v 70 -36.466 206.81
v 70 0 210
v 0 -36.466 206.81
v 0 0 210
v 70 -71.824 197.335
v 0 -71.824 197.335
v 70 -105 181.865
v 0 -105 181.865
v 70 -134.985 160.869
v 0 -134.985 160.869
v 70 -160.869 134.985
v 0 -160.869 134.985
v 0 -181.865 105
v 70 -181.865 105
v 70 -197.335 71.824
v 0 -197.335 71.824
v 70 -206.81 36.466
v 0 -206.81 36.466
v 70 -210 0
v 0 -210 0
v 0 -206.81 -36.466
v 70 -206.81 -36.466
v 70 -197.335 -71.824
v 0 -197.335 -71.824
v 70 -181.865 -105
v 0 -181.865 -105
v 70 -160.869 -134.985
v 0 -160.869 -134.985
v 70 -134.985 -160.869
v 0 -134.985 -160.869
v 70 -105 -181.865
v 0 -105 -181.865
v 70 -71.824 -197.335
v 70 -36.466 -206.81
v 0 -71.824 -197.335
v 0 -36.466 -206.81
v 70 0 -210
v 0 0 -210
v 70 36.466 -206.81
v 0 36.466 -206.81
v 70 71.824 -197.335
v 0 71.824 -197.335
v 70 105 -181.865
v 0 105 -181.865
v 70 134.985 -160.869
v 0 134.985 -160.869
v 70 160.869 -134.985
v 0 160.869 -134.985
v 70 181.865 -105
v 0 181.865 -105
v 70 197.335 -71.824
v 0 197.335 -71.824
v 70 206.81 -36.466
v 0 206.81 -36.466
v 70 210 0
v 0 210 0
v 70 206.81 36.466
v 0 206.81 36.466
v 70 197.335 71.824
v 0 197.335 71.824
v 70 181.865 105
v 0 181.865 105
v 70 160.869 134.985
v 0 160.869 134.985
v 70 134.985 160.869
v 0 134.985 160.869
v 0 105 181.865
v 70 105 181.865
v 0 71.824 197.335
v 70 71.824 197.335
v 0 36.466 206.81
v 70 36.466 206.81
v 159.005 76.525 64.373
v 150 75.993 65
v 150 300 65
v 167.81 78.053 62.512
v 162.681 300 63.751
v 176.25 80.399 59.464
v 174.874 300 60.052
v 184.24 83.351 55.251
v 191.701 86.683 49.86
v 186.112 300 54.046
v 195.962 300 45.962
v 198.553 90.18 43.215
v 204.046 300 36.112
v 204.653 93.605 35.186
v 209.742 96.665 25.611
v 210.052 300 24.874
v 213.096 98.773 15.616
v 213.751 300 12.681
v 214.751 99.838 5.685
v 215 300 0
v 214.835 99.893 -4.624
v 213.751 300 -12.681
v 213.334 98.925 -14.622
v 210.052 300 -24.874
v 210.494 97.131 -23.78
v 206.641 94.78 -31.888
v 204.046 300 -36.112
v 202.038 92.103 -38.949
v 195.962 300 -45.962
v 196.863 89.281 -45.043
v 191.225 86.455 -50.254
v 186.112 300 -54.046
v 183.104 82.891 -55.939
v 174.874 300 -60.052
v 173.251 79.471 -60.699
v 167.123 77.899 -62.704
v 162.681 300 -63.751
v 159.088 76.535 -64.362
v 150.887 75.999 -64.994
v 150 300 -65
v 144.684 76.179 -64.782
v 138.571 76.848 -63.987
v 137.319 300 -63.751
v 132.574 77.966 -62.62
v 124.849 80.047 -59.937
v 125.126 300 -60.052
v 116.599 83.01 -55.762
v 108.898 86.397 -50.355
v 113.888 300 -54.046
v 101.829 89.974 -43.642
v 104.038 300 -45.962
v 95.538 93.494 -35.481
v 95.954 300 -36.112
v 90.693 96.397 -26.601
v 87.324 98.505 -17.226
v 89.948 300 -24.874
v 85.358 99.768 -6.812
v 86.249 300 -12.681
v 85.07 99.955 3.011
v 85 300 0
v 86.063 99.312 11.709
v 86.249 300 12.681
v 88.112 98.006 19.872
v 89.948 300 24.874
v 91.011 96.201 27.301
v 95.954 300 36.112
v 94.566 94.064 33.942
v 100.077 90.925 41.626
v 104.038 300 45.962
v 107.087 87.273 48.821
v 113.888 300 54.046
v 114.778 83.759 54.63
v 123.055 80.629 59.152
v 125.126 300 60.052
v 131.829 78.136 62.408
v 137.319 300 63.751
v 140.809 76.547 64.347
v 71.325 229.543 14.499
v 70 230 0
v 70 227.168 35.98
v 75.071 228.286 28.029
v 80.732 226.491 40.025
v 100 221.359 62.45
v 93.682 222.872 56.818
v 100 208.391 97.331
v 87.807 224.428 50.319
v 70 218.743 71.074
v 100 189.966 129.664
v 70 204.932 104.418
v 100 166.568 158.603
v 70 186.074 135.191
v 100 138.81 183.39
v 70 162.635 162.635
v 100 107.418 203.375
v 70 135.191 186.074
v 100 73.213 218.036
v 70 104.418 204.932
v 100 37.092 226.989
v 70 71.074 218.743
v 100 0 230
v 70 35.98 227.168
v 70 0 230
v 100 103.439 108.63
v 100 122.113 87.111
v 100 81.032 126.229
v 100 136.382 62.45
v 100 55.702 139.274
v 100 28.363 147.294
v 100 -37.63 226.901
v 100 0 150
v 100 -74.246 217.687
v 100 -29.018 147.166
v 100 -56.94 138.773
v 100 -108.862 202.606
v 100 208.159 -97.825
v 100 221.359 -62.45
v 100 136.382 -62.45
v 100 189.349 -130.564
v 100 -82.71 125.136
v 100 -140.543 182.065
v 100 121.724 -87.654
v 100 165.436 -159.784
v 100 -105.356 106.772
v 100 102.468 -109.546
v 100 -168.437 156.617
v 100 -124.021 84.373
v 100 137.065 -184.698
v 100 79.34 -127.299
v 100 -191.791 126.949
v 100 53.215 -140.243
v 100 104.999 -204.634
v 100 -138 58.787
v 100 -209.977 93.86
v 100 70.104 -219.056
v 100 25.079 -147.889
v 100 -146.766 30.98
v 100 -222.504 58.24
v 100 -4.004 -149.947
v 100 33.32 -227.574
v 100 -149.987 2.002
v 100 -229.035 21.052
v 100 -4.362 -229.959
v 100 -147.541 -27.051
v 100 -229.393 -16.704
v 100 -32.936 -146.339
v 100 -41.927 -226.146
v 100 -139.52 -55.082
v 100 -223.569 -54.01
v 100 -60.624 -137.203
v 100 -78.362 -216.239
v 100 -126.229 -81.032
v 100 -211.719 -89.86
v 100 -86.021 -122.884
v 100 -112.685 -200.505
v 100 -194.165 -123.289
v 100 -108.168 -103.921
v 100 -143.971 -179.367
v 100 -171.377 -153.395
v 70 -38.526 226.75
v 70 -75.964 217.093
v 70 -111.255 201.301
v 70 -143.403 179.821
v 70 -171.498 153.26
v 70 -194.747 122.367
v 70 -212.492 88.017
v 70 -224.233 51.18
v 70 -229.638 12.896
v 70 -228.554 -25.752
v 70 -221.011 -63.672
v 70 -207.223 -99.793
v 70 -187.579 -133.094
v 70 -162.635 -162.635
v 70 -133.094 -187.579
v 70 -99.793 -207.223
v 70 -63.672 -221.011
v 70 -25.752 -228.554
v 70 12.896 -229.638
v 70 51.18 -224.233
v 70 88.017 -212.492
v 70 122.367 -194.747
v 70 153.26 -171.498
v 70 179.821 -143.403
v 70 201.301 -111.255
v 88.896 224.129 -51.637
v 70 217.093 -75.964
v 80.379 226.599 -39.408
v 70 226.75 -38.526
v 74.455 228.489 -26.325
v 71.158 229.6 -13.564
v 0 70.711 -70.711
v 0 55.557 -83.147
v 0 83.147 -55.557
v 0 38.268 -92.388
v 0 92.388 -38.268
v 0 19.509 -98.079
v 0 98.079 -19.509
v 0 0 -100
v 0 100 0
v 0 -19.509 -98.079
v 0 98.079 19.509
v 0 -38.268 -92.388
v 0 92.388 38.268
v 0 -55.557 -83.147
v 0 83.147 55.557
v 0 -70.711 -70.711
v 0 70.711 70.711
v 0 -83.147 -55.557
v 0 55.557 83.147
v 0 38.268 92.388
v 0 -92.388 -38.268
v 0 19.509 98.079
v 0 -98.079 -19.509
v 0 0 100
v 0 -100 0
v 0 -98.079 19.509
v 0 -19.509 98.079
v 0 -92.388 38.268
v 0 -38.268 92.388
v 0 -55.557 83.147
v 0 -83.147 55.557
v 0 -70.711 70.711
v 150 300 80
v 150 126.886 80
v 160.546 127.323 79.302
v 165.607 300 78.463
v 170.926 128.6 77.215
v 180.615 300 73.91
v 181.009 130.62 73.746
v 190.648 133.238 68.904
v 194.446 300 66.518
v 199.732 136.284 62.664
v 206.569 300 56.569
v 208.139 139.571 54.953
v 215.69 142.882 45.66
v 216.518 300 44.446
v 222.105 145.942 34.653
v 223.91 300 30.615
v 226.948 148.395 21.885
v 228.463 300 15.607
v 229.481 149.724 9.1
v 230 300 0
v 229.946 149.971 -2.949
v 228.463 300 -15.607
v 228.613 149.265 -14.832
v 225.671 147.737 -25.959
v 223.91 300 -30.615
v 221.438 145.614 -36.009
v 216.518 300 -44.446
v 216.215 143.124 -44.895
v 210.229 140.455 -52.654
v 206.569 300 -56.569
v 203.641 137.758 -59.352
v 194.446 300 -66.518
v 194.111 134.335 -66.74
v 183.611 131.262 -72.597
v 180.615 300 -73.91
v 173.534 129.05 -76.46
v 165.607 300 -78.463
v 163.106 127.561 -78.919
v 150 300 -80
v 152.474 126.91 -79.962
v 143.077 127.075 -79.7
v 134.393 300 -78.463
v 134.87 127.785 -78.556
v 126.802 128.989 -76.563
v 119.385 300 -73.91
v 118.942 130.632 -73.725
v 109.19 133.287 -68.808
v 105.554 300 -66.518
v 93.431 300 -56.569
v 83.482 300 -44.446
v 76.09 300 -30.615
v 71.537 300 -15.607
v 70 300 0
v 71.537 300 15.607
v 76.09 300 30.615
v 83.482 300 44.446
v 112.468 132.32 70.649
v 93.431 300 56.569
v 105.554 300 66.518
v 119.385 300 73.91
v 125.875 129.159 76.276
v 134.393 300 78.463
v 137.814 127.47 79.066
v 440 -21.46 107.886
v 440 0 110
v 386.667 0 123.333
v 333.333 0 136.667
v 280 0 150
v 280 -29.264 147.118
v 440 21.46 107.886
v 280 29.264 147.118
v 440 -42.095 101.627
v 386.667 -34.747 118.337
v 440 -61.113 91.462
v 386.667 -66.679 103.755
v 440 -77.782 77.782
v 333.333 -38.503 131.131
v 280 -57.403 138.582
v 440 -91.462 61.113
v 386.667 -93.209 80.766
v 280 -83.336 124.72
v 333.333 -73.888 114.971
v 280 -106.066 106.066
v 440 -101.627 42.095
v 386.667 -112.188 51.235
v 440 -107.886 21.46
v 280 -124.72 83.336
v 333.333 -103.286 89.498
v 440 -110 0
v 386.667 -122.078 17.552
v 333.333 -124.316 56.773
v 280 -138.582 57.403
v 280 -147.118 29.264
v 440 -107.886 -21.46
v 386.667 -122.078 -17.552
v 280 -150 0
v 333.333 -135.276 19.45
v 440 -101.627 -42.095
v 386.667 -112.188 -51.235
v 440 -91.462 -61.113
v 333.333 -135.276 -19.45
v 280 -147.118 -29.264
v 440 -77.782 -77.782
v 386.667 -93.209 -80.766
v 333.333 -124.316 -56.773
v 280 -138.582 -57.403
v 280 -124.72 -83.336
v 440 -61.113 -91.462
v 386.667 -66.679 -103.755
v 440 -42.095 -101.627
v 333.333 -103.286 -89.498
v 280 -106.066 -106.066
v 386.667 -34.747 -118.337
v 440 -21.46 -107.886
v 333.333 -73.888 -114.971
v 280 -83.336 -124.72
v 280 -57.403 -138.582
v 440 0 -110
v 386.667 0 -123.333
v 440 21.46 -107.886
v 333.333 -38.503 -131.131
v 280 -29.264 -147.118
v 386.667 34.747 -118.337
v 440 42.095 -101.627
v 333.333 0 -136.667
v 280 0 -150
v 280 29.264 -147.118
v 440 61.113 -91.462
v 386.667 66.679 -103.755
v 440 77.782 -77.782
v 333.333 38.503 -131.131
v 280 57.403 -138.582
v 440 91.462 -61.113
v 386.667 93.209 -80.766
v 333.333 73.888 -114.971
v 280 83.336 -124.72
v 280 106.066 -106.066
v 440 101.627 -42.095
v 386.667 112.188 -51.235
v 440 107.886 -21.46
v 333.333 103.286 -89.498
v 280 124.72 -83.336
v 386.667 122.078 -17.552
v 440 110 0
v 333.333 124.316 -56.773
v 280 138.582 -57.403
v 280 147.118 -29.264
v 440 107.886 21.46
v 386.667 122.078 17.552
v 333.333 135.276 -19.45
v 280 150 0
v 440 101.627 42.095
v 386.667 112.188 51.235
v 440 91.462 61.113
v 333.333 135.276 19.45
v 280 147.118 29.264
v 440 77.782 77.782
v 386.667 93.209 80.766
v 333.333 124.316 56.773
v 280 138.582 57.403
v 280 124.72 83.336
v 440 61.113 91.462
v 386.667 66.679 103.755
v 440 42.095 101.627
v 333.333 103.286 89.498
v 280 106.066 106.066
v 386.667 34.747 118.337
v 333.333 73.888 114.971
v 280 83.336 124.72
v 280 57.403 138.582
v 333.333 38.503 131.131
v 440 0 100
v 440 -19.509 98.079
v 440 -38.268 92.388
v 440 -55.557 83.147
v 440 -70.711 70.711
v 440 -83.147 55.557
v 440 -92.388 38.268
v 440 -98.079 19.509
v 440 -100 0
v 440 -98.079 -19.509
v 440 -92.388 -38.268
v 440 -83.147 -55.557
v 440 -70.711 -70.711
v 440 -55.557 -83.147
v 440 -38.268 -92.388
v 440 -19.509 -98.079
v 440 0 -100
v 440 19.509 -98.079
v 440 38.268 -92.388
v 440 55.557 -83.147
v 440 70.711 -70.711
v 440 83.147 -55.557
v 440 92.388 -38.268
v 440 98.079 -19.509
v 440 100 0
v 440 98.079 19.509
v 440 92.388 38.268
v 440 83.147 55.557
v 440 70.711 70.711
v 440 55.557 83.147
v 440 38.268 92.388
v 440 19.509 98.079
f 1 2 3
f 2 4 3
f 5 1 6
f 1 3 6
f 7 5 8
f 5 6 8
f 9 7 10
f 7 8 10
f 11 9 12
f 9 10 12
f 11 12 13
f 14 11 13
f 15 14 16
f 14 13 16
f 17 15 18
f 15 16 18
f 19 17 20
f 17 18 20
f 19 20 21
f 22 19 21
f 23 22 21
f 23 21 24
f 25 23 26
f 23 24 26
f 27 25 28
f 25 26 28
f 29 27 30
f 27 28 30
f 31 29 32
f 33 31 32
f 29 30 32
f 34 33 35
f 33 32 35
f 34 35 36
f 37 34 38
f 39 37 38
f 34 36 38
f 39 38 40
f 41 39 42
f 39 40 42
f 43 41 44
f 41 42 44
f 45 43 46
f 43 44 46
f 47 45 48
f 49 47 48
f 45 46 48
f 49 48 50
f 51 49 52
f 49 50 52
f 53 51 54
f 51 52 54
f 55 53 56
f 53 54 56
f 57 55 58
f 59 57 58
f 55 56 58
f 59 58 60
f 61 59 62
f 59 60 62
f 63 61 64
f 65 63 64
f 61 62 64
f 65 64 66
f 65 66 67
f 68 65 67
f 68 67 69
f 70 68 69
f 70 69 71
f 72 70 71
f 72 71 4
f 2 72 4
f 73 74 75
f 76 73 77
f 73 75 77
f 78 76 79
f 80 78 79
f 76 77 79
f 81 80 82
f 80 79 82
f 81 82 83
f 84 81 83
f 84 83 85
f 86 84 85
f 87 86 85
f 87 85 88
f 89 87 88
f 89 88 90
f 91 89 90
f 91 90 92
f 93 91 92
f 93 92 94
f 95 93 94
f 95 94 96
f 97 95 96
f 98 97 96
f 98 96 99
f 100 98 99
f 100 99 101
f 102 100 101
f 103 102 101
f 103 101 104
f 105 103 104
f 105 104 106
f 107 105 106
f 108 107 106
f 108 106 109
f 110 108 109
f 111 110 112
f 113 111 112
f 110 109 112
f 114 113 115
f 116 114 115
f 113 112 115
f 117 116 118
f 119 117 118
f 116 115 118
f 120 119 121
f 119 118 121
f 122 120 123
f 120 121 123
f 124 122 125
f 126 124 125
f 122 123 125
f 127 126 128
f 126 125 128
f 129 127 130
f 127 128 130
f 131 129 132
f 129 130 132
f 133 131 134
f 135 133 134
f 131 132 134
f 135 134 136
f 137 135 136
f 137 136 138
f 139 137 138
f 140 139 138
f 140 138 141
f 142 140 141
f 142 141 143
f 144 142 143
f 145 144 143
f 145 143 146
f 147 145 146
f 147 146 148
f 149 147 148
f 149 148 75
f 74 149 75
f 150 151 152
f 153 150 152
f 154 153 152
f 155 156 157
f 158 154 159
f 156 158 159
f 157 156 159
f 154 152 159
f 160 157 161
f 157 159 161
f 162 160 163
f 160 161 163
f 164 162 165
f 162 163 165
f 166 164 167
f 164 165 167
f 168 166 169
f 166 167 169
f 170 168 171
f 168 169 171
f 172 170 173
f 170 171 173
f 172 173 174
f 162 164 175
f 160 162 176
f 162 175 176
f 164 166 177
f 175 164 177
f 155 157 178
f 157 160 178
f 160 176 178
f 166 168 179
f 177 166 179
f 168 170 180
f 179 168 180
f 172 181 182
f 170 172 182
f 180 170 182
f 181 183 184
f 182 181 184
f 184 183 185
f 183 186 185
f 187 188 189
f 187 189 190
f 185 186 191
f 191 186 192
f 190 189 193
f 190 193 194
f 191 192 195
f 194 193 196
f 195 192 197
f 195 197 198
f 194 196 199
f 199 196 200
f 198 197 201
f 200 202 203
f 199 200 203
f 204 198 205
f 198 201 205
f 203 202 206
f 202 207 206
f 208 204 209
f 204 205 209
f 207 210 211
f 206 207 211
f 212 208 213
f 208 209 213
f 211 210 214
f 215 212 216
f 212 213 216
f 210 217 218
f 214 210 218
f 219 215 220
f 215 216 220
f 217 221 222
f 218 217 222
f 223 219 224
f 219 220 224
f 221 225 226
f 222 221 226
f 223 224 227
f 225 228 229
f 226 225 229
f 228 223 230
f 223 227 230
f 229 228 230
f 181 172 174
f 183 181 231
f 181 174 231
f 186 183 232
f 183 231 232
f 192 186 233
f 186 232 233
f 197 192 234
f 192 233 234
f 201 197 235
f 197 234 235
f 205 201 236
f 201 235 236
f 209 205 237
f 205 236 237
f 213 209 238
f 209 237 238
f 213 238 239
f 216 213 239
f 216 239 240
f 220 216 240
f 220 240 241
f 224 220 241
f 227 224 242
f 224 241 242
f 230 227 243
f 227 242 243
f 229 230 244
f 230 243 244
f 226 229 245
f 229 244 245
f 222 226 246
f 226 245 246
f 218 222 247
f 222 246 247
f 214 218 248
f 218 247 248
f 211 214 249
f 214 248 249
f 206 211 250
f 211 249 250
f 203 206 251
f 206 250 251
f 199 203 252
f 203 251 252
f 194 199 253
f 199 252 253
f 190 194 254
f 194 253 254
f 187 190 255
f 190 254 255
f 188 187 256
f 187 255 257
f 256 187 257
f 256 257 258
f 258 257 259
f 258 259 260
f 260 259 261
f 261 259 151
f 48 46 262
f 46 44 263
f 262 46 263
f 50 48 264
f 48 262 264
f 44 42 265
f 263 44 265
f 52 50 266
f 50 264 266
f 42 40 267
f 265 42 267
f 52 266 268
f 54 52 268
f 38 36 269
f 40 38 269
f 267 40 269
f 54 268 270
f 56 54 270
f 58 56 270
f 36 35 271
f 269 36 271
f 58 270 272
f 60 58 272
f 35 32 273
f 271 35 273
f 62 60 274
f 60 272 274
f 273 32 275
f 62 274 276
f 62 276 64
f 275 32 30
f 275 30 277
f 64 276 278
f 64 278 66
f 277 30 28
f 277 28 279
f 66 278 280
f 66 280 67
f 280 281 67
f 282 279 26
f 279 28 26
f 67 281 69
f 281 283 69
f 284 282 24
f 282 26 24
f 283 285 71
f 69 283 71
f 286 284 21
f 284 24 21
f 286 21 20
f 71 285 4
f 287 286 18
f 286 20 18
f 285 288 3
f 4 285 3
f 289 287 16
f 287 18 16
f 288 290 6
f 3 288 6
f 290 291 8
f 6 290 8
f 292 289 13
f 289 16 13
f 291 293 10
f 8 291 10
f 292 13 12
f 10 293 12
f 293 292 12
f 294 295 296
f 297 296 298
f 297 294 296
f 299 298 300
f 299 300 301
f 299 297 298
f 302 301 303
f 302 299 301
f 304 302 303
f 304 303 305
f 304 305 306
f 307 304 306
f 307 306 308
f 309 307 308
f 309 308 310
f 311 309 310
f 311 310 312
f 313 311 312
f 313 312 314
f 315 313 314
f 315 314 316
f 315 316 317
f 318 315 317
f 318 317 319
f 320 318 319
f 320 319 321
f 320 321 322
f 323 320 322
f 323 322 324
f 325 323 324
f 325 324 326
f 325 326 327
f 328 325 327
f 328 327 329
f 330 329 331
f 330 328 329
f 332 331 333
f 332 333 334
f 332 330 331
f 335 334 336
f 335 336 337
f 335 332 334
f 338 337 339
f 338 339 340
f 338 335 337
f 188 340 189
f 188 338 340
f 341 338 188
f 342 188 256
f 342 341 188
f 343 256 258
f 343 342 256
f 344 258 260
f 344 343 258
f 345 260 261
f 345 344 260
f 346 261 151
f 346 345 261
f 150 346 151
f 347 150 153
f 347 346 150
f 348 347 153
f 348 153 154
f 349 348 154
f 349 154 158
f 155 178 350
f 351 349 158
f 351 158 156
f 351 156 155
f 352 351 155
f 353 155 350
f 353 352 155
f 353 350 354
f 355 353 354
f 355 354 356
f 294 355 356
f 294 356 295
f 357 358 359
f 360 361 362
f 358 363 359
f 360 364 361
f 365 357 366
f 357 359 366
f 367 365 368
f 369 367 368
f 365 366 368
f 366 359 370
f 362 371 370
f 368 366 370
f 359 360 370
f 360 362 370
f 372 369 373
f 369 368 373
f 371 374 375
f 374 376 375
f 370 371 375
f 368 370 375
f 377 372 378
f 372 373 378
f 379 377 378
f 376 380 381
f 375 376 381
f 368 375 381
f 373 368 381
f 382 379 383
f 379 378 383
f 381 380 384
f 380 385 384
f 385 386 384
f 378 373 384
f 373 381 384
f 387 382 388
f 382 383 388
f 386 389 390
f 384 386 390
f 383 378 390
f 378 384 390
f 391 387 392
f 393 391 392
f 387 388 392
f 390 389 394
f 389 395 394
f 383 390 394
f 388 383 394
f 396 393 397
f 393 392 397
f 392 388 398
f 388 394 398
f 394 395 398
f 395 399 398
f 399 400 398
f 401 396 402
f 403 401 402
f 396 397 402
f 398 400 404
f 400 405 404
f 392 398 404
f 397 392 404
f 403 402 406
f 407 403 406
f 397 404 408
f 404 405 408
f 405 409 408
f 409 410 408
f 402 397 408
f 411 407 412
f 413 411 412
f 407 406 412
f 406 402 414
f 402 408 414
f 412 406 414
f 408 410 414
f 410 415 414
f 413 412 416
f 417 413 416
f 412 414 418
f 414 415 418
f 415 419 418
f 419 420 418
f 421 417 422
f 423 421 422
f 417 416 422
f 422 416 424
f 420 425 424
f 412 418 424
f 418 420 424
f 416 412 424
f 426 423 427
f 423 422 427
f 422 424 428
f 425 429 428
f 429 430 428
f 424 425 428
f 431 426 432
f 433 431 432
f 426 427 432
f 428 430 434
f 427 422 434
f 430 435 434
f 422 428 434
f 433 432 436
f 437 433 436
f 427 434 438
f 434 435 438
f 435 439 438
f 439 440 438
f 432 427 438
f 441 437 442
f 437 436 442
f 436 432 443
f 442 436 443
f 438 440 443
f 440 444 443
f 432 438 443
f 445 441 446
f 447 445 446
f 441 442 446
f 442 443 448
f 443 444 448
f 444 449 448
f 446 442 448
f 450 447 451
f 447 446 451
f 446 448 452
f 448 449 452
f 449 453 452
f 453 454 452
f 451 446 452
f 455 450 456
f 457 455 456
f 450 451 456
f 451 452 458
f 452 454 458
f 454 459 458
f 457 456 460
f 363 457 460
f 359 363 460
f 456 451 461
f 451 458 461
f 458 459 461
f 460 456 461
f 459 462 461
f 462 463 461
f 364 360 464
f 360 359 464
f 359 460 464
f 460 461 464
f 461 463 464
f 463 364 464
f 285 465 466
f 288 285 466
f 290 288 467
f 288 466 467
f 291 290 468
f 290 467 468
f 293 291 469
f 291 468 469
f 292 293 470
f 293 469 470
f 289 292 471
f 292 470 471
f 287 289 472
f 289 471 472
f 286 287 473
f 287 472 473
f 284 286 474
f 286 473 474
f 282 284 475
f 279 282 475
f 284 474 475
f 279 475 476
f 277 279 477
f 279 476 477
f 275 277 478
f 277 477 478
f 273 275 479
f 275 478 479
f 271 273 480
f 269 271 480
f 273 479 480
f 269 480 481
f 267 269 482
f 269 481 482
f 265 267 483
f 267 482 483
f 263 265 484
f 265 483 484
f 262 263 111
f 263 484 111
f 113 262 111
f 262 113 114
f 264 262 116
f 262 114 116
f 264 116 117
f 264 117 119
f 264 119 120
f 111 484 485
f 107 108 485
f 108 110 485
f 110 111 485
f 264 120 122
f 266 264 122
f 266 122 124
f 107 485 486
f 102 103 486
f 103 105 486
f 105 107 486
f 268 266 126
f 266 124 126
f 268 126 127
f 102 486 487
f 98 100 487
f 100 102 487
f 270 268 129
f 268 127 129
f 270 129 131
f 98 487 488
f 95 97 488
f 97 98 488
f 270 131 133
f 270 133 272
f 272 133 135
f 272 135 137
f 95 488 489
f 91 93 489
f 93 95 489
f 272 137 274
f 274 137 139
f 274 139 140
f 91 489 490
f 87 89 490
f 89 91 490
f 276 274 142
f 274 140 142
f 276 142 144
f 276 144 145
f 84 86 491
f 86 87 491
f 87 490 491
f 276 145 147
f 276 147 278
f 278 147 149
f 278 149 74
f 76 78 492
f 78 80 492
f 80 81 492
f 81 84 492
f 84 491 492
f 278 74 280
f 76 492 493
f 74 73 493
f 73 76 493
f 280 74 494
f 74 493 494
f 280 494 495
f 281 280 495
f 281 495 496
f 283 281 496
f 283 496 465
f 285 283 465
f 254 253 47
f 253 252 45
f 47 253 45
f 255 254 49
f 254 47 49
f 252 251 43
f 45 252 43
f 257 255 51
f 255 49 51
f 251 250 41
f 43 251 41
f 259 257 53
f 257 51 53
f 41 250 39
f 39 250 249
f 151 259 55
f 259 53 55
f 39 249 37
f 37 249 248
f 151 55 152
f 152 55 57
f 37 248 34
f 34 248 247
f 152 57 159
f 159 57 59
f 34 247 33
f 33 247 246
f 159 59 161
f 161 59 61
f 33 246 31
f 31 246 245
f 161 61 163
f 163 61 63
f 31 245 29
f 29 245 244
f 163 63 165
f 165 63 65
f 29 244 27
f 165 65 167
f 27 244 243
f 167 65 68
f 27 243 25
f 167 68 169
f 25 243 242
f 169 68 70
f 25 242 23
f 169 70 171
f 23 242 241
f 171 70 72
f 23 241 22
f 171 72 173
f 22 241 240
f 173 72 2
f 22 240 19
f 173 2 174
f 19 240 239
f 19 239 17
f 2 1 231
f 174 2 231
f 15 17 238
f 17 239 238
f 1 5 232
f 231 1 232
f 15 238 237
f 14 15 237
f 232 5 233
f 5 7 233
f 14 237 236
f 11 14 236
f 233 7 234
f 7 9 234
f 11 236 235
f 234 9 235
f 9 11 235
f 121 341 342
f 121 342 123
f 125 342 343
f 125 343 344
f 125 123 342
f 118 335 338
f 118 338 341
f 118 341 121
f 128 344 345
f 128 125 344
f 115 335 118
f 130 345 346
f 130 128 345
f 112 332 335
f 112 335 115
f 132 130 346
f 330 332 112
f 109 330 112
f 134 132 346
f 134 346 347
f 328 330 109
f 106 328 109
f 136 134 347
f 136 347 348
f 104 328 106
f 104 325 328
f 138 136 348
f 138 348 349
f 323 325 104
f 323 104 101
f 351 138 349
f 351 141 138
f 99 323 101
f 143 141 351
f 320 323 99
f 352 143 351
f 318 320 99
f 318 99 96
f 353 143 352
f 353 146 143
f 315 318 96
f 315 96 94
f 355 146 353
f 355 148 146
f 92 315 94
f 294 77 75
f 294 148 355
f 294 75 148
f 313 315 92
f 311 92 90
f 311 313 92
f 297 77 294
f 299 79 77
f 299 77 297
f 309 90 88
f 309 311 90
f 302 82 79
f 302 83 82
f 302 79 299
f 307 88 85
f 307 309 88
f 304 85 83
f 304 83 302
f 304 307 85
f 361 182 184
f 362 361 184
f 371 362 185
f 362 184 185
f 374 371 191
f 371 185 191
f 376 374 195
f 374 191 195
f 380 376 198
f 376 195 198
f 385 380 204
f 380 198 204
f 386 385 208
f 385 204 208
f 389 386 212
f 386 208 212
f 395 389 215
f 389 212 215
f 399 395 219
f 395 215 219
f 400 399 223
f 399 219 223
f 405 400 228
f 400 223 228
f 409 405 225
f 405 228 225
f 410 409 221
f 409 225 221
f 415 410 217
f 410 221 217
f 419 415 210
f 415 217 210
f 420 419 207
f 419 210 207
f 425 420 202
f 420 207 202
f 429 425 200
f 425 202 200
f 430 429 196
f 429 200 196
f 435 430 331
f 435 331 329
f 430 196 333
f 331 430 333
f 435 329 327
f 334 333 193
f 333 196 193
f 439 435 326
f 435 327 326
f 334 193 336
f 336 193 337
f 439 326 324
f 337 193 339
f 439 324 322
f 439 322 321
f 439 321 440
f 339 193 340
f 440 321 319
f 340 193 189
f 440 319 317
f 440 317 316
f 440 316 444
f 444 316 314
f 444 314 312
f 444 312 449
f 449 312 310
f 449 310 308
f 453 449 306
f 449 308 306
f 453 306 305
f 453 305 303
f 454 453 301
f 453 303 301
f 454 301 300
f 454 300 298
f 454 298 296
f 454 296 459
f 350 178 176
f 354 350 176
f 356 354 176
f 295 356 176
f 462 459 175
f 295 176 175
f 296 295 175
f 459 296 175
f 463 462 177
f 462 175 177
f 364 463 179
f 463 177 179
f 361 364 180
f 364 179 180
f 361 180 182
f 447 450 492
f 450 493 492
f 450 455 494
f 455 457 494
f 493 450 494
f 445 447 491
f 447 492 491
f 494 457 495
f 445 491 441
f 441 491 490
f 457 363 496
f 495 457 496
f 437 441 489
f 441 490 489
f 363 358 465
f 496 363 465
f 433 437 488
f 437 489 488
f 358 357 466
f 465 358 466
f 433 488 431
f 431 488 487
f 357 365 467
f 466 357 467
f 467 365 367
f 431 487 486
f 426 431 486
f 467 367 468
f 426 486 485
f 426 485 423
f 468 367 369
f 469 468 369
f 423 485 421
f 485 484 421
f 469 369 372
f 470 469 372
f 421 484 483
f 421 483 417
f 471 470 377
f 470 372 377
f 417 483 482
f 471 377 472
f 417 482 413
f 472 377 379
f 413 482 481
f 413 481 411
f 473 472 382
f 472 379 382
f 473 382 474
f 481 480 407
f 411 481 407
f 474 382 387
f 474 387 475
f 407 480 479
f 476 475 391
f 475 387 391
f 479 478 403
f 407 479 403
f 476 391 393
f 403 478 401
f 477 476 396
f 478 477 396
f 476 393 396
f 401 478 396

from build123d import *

# Parameters (mm, degrees)
BOSS_EXTRU_1_REACH      = 728.223
ESQUISSE3_R             = 80
ESQUISSE4_R             = 65
ENL_V_MAT_EXTRU_1_DEPTH = 280


with BuildPart() as part:
    # Esquisse1 → Révolution1 (revolve)
    with BuildSketch(Plane.XY, mode=Mode.PRIVATE) as r_volution1_sk:
        Polygon((0, 100), (440, 100), (440, 110), (280, 150), (100, 150), (100, 230), (70, 230), (70, 210), (0, 210), align=None)
    revolve(r_volution1_sk.sketch.rotate(Axis((0, 0, 0), (1, 0, 0)), 90), axis=Axis((0, 0, 0), (1, 0, 0)))

    # Esquisse3 → Boss.-Extru.1 (add, up to next)
    with BuildSketch(Plane(origin=(0, 300, 0), x_dir=(1, 0, 0), z_dir=(0, 1, 0)), mode=Mode.PRIVATE) as boss_extru_1_sk1:
        with Locations(Location((150, 0, 0), (0, 0, 270))):
            Circle(ESQUISSE3_R)
    boss_extru_1_tool1 = extrude(boss_extru_1_sk1.sketch, amount=-BOSS_EXTRU_1_REACH, mode=Mode.PRIVATE) - part.part
    add(boss_extru_1_tool1.solids().sort_by_distance((150, 300, 0))[0])

    # Esquisse4 → Enlèv. mat.-Extru.1 (cut)
    with BuildSketch(Plane(origin=(0, 300, 0), x_dir=(1, 0, 0), z_dir=(0, 1, 0))):
        with Locations(Location((150, 0, 0), (0, 0, 270))):
            Circle(ESQUISSE4_R)
    extrude(amount=-ENL_V_MAT_EXTRU_1_DEPTH, mode=Mode.SUBTRACT)


solid = part.part
